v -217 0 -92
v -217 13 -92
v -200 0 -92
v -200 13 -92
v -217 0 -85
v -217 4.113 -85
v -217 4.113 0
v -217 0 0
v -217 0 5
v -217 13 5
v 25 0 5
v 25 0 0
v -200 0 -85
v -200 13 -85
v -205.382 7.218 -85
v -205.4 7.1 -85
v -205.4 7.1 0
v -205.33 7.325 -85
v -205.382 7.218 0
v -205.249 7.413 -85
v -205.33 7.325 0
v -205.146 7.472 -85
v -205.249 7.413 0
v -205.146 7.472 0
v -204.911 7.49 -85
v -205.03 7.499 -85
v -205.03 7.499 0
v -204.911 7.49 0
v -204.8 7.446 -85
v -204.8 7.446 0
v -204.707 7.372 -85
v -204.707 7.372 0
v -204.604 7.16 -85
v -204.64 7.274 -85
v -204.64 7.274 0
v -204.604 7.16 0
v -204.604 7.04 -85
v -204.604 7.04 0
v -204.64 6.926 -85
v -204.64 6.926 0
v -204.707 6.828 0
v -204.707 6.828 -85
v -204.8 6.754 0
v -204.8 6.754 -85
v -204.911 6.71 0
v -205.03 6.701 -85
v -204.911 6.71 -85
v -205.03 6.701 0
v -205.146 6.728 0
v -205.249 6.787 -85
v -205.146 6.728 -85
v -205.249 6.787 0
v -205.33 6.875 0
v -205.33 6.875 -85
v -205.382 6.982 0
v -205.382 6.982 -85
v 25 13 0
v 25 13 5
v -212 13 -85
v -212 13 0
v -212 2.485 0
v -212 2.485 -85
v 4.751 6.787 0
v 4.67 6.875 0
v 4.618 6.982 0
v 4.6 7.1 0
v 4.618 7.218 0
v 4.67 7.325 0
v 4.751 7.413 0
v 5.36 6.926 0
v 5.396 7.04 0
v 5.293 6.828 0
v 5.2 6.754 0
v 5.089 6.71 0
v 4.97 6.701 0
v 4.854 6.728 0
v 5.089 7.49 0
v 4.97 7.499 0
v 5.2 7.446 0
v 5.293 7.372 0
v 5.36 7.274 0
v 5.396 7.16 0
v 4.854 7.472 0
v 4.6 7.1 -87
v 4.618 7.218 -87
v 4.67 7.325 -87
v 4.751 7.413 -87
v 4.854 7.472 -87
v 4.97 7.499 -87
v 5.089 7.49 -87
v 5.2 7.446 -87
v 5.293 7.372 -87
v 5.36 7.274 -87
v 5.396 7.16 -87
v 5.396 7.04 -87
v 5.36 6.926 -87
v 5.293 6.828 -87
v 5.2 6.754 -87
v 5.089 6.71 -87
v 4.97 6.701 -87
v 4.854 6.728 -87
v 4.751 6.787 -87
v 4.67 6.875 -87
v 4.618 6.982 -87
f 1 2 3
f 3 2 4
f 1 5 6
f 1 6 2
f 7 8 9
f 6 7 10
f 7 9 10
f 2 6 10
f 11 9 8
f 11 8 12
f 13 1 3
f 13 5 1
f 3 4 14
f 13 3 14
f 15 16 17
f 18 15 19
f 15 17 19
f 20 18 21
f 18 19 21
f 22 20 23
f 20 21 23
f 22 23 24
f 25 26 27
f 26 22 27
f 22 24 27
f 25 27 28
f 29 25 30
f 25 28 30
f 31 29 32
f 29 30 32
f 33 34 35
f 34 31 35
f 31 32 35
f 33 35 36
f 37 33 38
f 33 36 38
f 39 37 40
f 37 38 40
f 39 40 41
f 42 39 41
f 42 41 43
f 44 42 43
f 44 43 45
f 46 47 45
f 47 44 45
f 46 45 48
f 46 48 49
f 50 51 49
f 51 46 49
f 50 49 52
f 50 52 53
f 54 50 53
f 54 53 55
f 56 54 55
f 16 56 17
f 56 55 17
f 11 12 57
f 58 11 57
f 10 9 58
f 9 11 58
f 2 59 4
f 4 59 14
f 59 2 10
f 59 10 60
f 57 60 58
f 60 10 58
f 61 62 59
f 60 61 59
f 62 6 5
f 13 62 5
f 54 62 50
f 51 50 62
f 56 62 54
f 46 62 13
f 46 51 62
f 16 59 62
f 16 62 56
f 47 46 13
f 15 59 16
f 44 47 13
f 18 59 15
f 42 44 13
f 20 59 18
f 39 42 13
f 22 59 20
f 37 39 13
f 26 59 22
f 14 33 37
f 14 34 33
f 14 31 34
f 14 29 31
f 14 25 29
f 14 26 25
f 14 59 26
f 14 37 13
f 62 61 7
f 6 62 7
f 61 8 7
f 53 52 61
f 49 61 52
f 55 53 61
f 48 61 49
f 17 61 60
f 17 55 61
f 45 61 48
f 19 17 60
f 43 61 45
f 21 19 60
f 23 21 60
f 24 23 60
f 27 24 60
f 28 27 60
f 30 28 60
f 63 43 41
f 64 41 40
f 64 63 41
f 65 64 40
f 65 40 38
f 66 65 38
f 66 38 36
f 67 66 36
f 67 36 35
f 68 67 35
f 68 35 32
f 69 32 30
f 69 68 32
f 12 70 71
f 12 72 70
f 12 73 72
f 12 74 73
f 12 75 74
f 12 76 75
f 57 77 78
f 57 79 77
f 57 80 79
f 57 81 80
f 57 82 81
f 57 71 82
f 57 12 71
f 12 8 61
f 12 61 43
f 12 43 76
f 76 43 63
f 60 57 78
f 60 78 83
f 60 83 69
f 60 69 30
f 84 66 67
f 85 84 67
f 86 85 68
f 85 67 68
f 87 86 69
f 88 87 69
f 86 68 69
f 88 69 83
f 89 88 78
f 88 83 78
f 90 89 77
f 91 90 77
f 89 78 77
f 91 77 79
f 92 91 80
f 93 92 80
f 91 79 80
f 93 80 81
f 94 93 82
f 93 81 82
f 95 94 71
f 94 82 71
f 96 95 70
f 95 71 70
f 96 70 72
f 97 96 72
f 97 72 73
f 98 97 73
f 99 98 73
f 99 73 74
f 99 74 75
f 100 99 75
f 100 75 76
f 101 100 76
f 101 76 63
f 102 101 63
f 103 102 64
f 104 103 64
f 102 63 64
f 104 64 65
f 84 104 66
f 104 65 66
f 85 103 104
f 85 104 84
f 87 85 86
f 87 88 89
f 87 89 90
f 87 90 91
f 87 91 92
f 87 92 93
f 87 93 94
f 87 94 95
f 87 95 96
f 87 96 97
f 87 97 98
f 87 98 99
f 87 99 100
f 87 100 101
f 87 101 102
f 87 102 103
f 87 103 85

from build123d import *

# Parameters (mm, degrees)
SKETCH1_W           = 25
SKETCH1_H           = 13
BOSS_EXTRUDE1_DEPTH = 5
SKETCH2_R           = 0.4
BOSS_EXTRUDE2_DEPTH = 87
SKETCH3_W           = 5
SKETCH3_H           = 13
BOSS_EXTRUDE3_DEPTH = 210
SKETCH4_R           = 0.4
BOSS_EXTRUDE4_DEPTH = 87
SKETCH5_W           = 5
SKETCH5_H           = 13
BOSS_EXTRUDE5_DEPTH = 7
SKETCH6_W           = 5
SKETCH6_H           = 13
BOSS_EXTRUDE6_DEPTH = 92
BOSS_EXTRUDE7_START = -13
SKETCH8_W           = 12
SKETCH8_H           = 7
BOSS_EXTRUDE7_DEPTH = 13
CUT_EXTRUDE4_DEPTH  = 85


with BuildPart() as part:
    # Sketch1 → Boss-Extrude1 (new body)
    with BuildSketch(Plane.XY):
        with Locations((12.5, 6.5)):
            Rectangle(SKETCH1_W, SKETCH1_H)
    extrude(amount=BOSS_EXTRUDE1_DEPTH)

    # Sketch2 → Boss-Extrude2 (add)
    with BuildSketch(Plane(origin=(0, 0, 0), x_dir=(-1, 0, 0), z_dir=(0, 0, -1))):
        with Locations((-5, 7.1)):
            Circle(SKETCH2_R)
    extrude(amount=BOSS_EXTRUDE2_DEPTH)

    # Sketch3 → Boss-Extrude3 (add)
    with BuildSketch(Plane.ZY):
        with Locations((2.5, 6.5)):
            Rectangle(SKETCH3_W, SKETCH3_H)
    extrude(amount=BOSS_EXTRUDE3_DEPTH)

    # Sketch4 → Boss-Extrude4 (add)
    with BuildSketch(Plane(origin=(0, 0, 0), x_dir=(-1, 0, 0), z_dir=(0, 0, -1))):
        with Locations((205, 7.1)):
            Circle(SKETCH4_R)
    extrude(amount=BOSS_EXTRUDE4_DEPTH)

    # Sketch5 → Boss-Extrude5 (add)
    with BuildSketch(Plane.ZY.offset(210)):
        with Locations((2.5, 6.5)):
            Rectangle(SKETCH5_W, SKETCH5_H)
    extrude(amount=BOSS_EXTRUDE5_DEPTH)

    # Sketch6 → Boss-Extrude6 (add)
    with BuildSketch(Plane(origin=(0, 0, 0), x_dir=(-1, 0, 0), z_dir=(0, 0, -1))):
        with Locations((214.5, 6.5)):
            Rectangle(SKETCH6_W, SKETCH6_H)
    extrude(amount=BOSS_EXTRUDE6_DEPTH)

    # Sketch8 → Boss-Extrude7 (add)
    with BuildSketch(Plane.XZ.offset(BOSS_EXTRUDE7_START)):
        with Locations((-206, -88.5)):
            Rectangle(SKETCH8_W, SKETCH8_H)
    extrude(amount=BOSS_EXTRUDE7_DEPTH)

    # Sketch12 → Cut-Extrude4 (cut)
    with BuildSketch(Plane(origin=(0, 0, 0), x_dir=(-1, 0, 0), z_dir=(0, 0, -1))):
        Polygon((204.365486279, 0), (217, 4.113001179), (217, 0), align=None)
    extrude(amount=CUT_EXTRUDE4_DEPTH, mode=Mode.SUBTRACT)


solid = part.part
